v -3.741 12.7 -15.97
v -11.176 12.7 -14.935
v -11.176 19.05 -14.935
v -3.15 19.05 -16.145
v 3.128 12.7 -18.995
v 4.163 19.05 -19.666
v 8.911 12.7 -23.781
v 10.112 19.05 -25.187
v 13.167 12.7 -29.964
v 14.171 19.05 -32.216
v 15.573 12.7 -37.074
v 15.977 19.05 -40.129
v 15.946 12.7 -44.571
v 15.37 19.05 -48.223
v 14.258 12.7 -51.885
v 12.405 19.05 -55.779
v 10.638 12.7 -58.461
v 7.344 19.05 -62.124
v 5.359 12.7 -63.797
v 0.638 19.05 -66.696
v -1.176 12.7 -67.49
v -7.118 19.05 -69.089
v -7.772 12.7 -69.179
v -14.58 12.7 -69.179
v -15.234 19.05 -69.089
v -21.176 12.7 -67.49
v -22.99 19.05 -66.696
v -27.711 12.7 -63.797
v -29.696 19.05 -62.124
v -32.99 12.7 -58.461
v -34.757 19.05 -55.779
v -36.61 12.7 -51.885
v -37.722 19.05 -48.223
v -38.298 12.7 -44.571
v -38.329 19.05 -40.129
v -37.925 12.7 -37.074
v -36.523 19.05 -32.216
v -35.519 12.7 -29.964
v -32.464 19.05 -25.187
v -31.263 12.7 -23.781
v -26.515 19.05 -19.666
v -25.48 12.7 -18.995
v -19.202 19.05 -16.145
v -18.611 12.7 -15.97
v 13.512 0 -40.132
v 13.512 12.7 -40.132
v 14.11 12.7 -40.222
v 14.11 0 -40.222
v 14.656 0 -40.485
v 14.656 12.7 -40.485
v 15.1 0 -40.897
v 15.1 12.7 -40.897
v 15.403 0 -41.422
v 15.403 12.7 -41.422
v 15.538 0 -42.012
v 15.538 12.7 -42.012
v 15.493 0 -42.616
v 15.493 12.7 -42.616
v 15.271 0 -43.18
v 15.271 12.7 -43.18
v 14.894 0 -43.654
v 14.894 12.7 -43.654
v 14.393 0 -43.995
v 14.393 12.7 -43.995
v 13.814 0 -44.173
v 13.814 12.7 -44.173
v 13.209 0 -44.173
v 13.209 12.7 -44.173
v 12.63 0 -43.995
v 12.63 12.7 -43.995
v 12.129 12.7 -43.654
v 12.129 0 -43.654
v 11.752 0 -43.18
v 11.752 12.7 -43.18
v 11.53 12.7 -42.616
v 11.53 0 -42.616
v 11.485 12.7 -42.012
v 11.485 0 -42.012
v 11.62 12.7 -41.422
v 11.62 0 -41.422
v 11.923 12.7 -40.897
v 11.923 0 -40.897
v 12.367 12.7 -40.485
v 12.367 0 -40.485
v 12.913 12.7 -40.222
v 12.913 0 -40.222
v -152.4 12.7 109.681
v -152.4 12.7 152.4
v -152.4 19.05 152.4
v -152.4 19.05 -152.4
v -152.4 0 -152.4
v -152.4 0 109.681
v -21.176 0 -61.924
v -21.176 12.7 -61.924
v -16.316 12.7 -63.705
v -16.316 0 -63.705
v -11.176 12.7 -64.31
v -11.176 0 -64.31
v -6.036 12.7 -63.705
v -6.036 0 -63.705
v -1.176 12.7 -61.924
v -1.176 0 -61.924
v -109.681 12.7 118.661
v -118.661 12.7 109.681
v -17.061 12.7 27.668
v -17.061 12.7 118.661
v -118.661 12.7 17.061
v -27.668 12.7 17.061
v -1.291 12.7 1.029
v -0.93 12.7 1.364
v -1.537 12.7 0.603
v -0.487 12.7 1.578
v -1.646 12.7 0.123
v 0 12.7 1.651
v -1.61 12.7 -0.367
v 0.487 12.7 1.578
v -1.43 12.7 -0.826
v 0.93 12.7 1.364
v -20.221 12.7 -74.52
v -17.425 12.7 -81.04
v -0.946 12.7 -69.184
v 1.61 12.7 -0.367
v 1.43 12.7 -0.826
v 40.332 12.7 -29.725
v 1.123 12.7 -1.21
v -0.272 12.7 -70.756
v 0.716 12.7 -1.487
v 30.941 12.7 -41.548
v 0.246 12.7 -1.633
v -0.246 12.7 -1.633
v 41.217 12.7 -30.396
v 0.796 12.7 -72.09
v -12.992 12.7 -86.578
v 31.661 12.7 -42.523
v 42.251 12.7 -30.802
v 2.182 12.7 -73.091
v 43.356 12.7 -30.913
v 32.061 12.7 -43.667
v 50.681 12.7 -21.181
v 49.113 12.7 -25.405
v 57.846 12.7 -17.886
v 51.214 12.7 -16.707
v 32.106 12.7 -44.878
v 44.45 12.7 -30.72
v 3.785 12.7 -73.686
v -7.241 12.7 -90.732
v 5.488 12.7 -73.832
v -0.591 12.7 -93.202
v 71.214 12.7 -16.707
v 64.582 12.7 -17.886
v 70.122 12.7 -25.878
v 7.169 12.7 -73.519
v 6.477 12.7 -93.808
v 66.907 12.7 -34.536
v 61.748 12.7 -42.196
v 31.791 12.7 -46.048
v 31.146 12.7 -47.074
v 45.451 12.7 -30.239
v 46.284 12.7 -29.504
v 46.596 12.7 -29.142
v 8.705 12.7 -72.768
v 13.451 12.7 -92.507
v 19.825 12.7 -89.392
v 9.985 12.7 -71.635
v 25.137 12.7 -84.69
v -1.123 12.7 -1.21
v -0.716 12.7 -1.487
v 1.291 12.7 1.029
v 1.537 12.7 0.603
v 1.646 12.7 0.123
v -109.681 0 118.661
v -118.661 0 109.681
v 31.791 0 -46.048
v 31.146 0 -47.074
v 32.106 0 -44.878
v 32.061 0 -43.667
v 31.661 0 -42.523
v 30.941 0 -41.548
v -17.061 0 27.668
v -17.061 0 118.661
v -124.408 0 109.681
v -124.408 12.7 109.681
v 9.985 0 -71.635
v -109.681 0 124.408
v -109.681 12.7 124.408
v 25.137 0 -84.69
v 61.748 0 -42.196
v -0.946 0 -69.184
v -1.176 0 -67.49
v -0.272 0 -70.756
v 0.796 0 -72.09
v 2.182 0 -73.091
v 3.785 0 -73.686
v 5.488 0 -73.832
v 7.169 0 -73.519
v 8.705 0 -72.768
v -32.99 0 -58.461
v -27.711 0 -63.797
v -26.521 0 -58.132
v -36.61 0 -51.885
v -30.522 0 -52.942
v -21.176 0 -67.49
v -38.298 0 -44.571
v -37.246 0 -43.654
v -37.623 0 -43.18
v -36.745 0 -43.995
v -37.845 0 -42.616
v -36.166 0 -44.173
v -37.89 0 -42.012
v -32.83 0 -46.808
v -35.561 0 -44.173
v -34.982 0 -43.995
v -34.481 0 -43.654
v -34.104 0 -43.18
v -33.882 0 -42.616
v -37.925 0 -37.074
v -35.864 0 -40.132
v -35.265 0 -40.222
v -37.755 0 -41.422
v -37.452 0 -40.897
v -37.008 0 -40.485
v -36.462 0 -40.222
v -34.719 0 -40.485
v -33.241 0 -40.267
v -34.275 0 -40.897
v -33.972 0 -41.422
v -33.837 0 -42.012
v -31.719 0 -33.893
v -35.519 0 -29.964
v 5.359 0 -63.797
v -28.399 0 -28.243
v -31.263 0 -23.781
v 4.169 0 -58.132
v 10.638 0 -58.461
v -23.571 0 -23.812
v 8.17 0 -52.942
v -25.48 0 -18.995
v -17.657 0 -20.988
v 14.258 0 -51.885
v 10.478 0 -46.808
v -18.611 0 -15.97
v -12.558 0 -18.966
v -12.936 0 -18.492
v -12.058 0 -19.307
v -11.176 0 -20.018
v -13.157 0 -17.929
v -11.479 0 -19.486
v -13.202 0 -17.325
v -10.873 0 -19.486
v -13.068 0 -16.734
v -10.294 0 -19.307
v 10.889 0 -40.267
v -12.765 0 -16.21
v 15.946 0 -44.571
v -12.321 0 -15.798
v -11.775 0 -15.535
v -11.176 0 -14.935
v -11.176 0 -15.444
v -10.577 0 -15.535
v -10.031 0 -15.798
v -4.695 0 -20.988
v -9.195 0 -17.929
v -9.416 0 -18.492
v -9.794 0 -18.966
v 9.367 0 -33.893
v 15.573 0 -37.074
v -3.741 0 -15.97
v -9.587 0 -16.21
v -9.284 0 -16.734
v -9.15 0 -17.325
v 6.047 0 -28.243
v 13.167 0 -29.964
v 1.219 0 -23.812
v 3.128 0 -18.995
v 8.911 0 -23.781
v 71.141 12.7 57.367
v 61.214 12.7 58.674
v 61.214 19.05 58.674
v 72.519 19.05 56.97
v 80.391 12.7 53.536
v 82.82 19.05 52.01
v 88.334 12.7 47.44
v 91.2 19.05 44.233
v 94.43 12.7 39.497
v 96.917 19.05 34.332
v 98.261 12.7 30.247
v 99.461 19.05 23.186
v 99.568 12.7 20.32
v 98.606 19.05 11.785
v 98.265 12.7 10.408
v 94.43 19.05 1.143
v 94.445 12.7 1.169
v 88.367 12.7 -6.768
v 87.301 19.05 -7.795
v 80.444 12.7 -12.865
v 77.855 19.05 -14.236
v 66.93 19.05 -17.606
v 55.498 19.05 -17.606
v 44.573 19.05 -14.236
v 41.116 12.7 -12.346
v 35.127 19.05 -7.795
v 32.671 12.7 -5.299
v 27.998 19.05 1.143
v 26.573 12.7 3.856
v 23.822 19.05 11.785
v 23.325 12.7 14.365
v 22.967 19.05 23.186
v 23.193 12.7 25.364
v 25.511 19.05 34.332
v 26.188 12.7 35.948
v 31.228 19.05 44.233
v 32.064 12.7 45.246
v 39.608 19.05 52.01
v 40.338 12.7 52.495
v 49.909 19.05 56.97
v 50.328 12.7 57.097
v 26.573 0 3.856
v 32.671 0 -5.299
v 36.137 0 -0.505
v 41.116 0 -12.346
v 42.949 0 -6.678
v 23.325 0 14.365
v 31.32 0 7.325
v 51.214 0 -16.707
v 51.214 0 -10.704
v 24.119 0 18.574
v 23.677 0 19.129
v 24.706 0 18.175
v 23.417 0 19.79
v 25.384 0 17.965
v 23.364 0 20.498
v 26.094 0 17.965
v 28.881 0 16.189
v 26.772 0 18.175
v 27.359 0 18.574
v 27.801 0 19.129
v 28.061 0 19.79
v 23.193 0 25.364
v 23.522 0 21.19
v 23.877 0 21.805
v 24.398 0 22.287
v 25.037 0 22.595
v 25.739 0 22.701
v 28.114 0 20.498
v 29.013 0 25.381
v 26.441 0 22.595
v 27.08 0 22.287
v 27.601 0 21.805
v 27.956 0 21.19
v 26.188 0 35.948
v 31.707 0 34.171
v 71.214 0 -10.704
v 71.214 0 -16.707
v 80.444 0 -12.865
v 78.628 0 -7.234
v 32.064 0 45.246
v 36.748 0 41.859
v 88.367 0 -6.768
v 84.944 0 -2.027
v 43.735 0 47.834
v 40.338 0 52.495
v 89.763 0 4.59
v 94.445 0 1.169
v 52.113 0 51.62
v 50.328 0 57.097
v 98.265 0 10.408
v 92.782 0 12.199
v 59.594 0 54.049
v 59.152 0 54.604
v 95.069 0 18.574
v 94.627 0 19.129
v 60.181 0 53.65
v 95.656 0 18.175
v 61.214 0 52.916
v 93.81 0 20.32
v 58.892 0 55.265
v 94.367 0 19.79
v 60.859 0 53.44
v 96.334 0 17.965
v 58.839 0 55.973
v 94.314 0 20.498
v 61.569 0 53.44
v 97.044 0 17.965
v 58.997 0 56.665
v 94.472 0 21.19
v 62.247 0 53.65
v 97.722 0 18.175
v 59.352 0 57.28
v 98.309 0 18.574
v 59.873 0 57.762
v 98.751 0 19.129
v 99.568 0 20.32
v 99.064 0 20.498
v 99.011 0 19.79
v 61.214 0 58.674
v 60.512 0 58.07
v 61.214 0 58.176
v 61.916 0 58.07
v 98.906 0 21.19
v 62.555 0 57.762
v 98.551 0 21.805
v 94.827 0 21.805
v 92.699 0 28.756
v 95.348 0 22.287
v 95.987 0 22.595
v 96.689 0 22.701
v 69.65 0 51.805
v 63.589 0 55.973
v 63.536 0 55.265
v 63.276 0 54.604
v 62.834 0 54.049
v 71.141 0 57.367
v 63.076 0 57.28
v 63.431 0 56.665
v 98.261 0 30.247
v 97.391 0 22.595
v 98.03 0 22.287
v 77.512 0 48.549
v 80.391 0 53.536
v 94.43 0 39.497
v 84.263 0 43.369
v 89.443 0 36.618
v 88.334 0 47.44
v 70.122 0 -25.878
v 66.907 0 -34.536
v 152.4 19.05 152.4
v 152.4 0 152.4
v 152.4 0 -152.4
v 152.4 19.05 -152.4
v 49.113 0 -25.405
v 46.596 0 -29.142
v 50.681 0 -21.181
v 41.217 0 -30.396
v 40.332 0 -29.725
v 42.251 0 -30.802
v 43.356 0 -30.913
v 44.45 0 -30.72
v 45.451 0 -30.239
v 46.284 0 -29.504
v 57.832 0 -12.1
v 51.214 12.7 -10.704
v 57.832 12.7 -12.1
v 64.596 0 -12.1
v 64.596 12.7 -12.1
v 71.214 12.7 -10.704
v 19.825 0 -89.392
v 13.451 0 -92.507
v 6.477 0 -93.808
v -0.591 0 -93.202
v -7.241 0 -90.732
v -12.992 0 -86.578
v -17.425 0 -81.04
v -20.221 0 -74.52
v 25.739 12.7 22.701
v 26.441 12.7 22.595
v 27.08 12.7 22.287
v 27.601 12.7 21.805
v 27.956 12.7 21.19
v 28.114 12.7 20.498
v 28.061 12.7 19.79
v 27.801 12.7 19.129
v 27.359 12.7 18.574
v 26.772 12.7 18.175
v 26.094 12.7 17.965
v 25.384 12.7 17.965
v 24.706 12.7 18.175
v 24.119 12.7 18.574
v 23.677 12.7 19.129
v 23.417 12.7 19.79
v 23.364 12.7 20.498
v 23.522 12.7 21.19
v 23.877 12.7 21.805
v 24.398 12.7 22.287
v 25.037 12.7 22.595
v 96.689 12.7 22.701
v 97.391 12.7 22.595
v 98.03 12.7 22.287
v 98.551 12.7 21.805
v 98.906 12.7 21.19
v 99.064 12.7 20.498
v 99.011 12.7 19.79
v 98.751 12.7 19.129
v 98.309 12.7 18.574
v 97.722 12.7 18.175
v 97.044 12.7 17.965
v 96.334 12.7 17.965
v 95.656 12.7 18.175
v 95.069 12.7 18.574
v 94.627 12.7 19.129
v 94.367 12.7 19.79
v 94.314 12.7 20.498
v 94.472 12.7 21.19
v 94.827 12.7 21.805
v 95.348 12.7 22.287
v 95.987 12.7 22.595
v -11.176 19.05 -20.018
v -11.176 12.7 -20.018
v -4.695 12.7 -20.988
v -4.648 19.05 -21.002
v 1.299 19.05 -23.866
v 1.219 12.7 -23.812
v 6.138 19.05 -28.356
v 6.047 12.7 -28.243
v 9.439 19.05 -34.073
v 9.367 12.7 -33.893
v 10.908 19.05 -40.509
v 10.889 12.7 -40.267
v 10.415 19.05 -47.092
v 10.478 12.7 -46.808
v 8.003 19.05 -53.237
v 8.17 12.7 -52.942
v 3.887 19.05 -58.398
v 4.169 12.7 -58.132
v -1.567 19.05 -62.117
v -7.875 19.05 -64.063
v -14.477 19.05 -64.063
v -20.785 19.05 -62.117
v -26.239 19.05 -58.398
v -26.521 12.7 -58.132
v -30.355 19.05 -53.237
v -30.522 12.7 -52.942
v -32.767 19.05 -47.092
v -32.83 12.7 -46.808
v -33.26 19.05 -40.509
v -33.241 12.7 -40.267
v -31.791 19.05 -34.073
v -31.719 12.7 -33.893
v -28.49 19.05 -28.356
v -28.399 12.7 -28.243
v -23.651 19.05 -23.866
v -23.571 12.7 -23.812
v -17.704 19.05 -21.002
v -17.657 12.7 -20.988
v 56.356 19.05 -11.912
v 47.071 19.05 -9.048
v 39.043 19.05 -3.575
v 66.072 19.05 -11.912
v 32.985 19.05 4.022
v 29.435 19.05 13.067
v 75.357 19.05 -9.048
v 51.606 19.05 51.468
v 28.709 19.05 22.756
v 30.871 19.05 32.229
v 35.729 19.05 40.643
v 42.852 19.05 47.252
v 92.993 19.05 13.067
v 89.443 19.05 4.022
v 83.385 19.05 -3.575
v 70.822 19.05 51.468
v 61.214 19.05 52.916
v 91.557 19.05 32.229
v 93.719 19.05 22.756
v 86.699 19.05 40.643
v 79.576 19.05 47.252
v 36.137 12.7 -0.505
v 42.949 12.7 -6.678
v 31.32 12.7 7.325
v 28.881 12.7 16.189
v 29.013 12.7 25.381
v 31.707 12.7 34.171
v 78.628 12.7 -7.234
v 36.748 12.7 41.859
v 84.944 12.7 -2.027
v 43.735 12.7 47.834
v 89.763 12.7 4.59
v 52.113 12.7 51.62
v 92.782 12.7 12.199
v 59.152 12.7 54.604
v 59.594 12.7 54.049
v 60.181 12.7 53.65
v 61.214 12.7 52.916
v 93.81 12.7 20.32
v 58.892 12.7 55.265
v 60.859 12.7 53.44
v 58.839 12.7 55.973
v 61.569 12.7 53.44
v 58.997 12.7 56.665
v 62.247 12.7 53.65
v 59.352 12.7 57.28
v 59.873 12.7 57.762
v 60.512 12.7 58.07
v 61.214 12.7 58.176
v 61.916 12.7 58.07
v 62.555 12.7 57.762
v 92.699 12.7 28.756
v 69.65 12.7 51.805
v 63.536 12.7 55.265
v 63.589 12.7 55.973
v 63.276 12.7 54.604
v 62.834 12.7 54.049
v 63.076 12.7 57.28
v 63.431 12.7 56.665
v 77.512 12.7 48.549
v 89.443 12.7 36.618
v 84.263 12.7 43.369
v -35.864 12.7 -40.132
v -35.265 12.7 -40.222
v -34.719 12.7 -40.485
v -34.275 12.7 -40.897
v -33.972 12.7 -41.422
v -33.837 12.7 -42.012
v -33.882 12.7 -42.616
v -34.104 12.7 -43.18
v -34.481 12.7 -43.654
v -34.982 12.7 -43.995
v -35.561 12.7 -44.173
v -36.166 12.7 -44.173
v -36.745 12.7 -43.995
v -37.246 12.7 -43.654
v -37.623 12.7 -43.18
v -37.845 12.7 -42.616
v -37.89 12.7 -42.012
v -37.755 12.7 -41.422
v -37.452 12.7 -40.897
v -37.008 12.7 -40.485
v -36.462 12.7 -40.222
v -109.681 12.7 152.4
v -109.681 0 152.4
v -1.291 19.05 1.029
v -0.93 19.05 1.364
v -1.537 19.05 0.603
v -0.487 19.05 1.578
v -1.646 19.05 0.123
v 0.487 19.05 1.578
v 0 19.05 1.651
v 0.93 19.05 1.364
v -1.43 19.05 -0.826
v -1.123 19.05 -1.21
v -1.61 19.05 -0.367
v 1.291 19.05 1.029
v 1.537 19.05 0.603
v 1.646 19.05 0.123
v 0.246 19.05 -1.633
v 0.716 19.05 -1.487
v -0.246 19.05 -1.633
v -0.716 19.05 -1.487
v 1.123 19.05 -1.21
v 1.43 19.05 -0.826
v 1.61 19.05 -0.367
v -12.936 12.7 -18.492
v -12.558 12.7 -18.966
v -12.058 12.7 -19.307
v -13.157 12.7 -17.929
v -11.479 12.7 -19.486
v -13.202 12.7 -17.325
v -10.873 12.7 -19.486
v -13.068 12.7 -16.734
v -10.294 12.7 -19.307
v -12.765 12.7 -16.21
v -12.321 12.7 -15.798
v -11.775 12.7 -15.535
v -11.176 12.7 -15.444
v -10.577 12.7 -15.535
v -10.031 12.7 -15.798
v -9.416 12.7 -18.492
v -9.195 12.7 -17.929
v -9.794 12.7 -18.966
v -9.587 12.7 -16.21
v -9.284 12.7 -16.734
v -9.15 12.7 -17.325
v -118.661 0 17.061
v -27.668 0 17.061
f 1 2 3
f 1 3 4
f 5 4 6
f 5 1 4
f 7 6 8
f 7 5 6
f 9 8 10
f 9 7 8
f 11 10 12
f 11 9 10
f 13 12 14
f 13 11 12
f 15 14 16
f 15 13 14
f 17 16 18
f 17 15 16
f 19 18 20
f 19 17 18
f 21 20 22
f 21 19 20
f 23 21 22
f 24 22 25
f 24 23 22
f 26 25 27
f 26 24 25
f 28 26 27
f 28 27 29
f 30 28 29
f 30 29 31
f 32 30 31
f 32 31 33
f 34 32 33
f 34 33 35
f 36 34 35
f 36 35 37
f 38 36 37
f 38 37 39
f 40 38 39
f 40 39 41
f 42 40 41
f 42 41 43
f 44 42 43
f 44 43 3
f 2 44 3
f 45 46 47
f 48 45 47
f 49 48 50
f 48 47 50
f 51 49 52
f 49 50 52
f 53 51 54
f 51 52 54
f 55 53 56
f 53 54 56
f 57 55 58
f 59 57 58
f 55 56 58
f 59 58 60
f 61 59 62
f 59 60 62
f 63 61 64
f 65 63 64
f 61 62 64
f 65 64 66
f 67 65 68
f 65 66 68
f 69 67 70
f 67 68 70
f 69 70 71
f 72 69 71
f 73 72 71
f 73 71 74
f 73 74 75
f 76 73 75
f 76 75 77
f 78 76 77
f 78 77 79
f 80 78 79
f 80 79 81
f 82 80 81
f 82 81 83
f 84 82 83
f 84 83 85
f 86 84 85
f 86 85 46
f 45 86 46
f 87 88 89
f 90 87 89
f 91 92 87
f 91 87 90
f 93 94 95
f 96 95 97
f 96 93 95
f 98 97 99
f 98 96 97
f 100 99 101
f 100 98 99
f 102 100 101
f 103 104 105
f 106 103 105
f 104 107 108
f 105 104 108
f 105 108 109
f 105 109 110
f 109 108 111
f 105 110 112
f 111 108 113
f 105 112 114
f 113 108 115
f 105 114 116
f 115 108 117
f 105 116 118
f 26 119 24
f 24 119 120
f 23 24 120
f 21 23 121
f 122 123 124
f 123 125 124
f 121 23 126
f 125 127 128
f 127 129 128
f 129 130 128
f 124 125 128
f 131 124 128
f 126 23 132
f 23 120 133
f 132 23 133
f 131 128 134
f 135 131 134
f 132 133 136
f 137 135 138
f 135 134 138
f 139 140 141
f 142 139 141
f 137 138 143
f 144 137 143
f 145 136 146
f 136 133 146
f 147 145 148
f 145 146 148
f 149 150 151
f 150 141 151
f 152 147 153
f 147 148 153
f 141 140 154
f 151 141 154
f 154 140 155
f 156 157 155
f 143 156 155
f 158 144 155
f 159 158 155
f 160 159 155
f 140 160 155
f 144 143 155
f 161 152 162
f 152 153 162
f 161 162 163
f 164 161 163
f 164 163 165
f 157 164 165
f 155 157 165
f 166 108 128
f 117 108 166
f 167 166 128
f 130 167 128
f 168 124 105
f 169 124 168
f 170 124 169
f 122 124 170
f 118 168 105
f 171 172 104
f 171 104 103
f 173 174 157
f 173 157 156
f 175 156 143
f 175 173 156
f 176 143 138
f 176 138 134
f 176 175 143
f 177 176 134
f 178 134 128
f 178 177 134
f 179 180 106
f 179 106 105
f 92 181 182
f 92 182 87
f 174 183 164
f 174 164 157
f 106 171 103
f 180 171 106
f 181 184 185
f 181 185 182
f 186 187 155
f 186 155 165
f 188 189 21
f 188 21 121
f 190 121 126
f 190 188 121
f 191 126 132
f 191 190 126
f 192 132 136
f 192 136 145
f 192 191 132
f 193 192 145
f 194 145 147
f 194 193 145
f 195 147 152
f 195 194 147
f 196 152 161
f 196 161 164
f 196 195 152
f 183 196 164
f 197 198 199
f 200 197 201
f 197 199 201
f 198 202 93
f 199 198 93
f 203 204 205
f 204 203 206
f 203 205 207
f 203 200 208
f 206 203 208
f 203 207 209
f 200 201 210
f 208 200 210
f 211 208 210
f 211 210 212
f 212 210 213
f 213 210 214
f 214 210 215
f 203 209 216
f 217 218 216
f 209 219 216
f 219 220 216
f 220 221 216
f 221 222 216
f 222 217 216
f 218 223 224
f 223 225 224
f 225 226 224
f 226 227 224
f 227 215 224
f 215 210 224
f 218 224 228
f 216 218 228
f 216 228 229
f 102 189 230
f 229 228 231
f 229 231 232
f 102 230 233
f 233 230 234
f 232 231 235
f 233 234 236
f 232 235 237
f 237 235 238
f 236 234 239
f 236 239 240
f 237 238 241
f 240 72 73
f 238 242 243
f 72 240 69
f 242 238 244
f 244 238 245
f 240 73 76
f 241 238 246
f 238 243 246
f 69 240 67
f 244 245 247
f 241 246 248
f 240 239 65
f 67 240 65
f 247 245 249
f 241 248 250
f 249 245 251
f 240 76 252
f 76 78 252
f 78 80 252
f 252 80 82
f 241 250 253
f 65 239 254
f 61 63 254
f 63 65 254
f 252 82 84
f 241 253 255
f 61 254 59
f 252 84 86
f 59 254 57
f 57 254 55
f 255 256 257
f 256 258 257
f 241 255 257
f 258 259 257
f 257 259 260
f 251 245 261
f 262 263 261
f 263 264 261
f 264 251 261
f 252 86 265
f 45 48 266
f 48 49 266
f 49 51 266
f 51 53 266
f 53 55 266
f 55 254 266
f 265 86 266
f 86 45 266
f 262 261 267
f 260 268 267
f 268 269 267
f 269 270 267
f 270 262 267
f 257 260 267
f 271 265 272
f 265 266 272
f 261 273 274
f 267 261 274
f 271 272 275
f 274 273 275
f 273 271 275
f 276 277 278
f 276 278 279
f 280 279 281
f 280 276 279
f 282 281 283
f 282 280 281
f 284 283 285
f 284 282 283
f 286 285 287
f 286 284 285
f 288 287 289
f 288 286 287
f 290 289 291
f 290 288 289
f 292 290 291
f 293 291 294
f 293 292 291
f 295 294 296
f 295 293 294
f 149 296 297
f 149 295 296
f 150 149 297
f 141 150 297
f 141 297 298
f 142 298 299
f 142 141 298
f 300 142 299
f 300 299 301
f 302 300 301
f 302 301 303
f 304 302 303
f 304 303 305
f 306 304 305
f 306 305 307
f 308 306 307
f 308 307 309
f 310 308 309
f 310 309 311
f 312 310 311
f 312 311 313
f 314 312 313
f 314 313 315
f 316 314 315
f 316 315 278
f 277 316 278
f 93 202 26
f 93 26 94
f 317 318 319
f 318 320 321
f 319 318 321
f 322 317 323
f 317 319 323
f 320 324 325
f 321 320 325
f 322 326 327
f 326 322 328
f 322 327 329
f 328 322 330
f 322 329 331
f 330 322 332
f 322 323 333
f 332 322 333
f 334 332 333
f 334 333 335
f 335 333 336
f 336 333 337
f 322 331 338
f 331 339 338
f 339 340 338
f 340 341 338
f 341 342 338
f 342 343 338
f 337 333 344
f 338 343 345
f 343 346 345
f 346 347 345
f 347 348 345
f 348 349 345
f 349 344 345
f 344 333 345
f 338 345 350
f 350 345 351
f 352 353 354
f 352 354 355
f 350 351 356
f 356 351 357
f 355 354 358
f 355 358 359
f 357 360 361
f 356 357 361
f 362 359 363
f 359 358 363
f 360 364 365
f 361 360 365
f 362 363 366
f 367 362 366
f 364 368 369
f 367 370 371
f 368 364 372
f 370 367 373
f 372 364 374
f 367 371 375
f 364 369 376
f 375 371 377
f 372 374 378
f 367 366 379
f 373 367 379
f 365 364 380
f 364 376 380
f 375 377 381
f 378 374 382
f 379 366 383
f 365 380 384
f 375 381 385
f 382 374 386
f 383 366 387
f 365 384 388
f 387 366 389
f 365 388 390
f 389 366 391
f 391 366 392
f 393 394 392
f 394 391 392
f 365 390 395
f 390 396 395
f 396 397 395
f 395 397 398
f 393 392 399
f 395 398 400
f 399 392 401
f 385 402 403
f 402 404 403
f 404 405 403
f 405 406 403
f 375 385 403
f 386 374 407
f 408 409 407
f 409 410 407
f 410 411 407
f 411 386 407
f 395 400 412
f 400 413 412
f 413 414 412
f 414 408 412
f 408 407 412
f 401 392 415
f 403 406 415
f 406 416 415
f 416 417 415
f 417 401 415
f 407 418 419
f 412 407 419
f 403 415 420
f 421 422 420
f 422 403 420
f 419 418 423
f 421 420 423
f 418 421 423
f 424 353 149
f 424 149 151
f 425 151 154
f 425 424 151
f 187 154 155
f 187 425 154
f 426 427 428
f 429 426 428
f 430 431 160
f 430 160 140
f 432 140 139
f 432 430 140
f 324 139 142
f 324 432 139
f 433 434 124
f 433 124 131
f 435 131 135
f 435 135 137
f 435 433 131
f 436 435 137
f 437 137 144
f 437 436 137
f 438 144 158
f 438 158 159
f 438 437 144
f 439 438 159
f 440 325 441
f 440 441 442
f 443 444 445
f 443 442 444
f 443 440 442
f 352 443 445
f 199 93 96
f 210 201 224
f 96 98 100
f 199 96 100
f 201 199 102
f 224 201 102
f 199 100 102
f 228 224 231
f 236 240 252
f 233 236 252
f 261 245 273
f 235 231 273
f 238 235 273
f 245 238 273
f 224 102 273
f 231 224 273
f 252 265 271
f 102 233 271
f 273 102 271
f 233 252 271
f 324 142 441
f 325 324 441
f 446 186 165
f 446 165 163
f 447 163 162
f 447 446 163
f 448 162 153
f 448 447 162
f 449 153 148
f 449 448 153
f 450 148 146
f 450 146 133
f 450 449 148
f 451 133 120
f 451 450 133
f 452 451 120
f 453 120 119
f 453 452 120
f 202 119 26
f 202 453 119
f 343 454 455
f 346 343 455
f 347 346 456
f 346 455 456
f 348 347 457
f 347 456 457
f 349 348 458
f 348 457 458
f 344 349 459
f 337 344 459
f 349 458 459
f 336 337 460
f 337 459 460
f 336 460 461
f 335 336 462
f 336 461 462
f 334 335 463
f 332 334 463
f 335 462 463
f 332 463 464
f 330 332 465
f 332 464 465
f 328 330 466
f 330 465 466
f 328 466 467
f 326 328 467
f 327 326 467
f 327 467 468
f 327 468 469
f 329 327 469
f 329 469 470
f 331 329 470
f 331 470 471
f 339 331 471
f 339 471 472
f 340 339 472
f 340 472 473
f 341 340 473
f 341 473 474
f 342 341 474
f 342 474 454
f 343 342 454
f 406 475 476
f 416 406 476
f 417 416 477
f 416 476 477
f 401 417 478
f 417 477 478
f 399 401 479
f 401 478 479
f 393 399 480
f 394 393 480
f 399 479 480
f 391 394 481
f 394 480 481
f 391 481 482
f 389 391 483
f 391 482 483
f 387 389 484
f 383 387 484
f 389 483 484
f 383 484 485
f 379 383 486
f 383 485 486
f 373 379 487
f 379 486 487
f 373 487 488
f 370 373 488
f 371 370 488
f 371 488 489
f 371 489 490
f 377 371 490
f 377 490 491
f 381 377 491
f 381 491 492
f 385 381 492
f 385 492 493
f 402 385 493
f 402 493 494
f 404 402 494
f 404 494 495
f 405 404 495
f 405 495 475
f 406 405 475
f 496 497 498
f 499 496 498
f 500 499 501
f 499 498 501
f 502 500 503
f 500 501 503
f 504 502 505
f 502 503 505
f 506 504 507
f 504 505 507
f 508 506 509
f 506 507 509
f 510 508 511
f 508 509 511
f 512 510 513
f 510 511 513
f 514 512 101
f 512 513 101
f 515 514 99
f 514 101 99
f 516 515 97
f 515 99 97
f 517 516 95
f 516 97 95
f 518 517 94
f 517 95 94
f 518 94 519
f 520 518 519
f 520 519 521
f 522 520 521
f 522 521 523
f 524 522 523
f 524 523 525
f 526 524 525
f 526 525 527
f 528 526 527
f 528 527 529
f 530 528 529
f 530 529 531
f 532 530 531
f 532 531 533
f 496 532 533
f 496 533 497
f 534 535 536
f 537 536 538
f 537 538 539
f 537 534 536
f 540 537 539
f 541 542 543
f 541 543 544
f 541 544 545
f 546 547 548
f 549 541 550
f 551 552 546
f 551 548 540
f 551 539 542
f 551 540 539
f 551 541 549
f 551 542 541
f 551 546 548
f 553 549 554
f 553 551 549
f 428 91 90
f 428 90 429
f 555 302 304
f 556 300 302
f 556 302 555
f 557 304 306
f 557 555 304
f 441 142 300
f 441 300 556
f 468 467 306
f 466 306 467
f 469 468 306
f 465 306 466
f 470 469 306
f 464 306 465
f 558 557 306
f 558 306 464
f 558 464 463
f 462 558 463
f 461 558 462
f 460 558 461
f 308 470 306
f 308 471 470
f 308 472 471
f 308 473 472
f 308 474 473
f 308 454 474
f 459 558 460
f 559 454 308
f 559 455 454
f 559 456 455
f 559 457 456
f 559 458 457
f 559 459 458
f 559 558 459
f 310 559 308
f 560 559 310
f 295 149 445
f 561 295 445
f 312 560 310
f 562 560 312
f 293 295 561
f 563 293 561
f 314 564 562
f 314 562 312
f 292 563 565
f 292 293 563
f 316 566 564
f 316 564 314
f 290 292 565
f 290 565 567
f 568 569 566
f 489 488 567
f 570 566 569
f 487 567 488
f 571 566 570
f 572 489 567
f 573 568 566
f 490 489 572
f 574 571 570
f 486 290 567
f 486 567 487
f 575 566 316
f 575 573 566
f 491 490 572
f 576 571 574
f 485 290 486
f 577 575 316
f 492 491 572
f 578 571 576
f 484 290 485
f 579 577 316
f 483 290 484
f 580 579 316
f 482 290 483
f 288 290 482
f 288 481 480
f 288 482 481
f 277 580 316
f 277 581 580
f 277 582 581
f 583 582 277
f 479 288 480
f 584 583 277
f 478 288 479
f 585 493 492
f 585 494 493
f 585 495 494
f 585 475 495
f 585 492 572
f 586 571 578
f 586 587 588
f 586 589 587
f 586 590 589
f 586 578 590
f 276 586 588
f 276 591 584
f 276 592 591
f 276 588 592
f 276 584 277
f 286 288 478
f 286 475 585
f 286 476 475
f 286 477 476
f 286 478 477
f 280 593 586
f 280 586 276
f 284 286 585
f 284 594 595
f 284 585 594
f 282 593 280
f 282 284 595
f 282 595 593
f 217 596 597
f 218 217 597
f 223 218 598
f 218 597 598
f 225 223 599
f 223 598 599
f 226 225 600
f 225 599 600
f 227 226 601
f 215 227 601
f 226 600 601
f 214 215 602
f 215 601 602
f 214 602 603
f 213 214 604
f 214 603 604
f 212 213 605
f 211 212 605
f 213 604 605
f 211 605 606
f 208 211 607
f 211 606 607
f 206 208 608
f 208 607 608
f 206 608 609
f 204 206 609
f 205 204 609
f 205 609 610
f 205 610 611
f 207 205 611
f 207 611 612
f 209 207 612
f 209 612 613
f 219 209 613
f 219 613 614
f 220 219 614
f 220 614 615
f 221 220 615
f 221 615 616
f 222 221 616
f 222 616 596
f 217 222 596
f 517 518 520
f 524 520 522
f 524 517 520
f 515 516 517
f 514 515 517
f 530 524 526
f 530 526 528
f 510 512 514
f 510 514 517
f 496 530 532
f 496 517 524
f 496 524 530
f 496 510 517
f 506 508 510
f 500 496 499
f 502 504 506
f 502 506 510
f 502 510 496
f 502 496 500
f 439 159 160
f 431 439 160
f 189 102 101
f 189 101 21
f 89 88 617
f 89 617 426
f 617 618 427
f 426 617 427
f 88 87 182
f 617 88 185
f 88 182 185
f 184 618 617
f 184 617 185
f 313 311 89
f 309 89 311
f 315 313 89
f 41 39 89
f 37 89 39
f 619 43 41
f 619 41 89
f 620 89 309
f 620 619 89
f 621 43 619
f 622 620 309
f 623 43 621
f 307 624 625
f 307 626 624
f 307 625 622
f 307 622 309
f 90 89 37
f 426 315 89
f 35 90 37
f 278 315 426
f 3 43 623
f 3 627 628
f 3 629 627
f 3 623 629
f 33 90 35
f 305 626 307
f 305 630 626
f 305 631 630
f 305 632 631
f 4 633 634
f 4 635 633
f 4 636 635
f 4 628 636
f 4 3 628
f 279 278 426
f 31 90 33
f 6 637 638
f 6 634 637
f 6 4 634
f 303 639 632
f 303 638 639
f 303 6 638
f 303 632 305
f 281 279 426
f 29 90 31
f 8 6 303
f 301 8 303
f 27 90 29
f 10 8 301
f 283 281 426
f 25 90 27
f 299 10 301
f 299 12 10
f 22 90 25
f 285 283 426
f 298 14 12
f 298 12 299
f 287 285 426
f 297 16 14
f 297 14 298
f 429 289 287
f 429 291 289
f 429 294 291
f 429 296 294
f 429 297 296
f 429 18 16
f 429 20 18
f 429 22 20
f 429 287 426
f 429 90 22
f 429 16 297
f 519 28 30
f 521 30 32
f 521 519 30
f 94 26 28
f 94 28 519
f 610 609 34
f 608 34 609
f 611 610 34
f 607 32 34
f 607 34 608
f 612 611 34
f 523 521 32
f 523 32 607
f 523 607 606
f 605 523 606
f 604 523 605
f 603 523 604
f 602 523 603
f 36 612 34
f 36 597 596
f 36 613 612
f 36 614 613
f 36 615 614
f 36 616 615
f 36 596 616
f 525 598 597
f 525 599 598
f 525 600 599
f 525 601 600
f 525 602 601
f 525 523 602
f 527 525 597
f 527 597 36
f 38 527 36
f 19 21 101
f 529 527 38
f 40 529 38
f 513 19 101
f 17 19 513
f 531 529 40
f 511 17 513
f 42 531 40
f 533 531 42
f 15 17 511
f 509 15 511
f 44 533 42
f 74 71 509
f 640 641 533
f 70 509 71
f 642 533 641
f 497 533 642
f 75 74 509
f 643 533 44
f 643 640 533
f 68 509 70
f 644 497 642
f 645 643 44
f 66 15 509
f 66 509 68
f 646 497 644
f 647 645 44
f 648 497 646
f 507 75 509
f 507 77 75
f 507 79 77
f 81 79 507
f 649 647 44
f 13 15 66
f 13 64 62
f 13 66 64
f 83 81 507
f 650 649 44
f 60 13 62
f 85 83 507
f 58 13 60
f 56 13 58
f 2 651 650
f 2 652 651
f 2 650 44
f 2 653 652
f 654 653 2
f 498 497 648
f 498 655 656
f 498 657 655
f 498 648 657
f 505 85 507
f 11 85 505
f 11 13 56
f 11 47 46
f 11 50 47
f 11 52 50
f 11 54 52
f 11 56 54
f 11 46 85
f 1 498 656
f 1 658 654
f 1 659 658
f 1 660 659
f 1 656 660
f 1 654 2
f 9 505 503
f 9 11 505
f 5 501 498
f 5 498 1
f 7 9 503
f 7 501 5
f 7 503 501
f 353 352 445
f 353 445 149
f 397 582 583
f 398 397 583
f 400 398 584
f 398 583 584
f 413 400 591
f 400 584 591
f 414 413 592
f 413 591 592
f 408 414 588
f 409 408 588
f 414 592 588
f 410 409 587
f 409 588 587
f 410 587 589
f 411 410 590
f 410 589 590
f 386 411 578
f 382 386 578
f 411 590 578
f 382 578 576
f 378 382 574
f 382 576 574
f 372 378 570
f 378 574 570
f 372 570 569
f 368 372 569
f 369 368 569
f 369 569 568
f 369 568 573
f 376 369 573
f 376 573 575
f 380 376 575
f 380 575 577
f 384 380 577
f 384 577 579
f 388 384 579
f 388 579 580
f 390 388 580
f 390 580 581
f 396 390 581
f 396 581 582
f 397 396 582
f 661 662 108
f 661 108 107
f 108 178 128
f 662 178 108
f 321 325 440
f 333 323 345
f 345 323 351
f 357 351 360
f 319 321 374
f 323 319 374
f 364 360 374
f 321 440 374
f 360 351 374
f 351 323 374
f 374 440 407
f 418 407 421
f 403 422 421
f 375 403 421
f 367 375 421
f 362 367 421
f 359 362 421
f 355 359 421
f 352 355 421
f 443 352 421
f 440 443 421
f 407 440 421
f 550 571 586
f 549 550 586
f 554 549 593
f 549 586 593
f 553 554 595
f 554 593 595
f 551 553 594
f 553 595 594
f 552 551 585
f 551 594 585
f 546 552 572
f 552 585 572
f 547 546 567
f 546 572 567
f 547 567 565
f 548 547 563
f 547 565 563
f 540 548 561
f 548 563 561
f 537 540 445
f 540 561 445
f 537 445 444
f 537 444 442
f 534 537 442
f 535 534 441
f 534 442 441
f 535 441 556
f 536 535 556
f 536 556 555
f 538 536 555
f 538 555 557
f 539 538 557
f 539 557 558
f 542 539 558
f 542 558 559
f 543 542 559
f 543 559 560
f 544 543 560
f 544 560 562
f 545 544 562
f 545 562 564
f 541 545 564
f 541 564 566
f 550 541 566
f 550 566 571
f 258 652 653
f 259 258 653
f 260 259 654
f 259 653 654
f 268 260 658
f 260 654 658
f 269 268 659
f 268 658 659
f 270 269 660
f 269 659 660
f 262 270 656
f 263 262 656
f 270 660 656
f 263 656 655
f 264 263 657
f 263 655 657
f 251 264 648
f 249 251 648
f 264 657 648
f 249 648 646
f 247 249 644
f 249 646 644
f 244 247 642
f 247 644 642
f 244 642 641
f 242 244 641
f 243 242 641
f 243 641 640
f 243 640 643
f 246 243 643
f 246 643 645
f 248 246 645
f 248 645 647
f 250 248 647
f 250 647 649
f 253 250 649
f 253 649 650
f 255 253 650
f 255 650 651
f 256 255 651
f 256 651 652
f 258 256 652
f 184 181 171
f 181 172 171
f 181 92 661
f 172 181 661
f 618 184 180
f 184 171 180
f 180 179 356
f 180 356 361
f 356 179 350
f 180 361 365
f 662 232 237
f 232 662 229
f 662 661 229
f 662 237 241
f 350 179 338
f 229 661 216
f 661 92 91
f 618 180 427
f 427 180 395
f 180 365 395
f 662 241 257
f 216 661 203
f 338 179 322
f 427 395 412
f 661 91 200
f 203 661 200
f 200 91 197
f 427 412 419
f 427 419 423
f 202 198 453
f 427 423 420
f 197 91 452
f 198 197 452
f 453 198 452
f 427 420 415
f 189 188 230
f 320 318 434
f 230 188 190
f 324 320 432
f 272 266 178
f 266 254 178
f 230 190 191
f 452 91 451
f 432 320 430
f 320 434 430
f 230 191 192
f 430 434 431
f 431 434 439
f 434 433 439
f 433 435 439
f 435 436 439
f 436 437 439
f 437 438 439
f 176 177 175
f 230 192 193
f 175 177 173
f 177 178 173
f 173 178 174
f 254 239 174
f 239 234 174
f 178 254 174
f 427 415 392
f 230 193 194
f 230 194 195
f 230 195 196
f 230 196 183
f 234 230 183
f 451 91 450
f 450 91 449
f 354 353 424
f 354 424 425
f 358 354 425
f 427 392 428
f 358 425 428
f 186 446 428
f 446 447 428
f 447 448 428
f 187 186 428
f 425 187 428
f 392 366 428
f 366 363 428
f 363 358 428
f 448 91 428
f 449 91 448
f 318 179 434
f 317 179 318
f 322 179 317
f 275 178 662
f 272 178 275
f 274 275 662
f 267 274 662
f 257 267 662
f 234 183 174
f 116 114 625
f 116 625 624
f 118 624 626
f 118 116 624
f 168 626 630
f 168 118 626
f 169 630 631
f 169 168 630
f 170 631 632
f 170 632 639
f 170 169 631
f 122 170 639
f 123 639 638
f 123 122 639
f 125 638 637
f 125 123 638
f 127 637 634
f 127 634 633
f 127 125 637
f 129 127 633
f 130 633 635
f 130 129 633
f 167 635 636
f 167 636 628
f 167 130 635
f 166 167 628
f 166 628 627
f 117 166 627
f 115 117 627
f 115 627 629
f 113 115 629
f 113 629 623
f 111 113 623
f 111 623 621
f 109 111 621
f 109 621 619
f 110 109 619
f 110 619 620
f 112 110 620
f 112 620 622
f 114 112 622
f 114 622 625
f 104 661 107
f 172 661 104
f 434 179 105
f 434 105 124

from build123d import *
from build123d.topology import SkipClean

# Parameters (mm, degrees)
SKETCH1_R             = 22.146000031
BOSS_EXTRUDE1_DEPTH   = 19.05
SKETCH1_R_2           = 32.595999959
BOSS_EXTRUDE1_2_DEPTH = 19.05
SKETCH1_W             = 304.8
SKETCH1_H             = 304.8
SKETCH1_R_3           = 27.229000025
SKETCH1_R_4           = 38.354
SKETCH1_R_5           = 1.651
BOSS_EXTRUDE1_3_DEPTH = 19.05
SKETCH1_4_R           = 27.229000025
SKETCH1_4_R_2         = 22.146000031
SKETCH1_4_R_3         = 38.354
SKETCH1_4_R_4         = 32.595999959
BOSS_EXTRUDE2_DEPTH   = 12.7
SKETCH1_5_R           = 1.651
CUT_EXTRUDE1_DEPTH    = 12.7
SKETCH5_R             = 2.032
SKETCH5_R_2           = 2.38125
CUT_EXTRUDE2_DEPTH    = 13.7


with BuildPart() as part:
    # Sketch1 → Boss-Extrude1 (new body)
    with BuildSketch(Plane(origin=(0, 0, 0), x_dir=(1, 0, 0), z_dir=(0, 1, 0))):
        with Locations(Location((-11.176, 42.164, 0), (0, 0, 270))):  # turned: the seam where the file's is
            Circle(SKETCH1_R)
    extrude(amount=BOSS_EXTRUDE1_DEPTH)



with BuildPart() as body_2:
    # Sketch1 → Boss-Extrude1 2 (new body)
    with BuildSketch(Plane(origin=(0, 0, 0), x_dir=(1, 0, 0), z_dir=(0, 1, 0))):
        with Locations(Location((61.214, -20.32, 0), (0, 0, 270))):  # turned: the seam where the file's is
            Circle(SKETCH1_R_2)
    extrude(amount=BOSS_EXTRUDE1_2_DEPTH)


with BuildPart() as body_3:
    # Sketch1 → Boss-Extrude1 3 (new body)
    with BuildSketch(Plane(origin=(0, 0, 0), x_dir=(1, 0, 0), z_dir=(0, 1, 0))):
        Rectangle(SKETCH1_W, SKETCH1_H)
        with Locations(Location((-11.176, 42.164, 0), (0, 0, 270))):  # turned: the seam where the file's is
            Circle(SKETCH1_R_3, mode=Mode.SUBTRACT)
        with Locations(Location((61.214, -20.32, 0), (0, 0, 270))):  # turned: the seam where the file's is
            Circle(SKETCH1_R_4, mode=Mode.SUBTRACT)
        with Locations(Location((0, 0, 0), (0, 0, 270))):  # turned: the seam where the file's is
            Circle(SKETCH1_R_5, mode=Mode.SUBTRACT)
    extrude(amount=BOSS_EXTRUDE1_3_DEPTH)


with BuildPart() as part_1:
    with SkipClean():  # keep this step's faces unmerged: merging them makes the solid invalid here
        add(part.part)

        add(body_2.part)  # Boss-Extrude2 merges body 2

        add(body_3.part)  # Boss-Extrude2 merges body 3
        # Sketch1_4 → Boss-Extrude2 (add)
        with BuildSketch(Plane(origin=(0, 0, 0), x_dir=(1, 0, 0), z_dir=(0, 1, 0))):
            with Locations(Location((-11.176, 42.164, 0), (0, 0, 270))):  # turned: the seam where the file's is
                Circle(SKETCH1_4_R)
            with Locations(Location((-11.176, 42.164, 0), (0, 0, 270))):  # turned: the seam where the file's is
                Circle(SKETCH1_4_R_2, mode=Mode.SUBTRACT)
            with Locations(Location((61.214, -20.32, 0), (0, 0, 270))):  # turned: the seam where the file's is
                Circle(SKETCH1_4_R_3)
            with Locations(Location((61.214, -20.32, 0), (0, 0, 270))):  # turned: the seam where the file's is
                Circle(SKETCH1_4_R_4, mode=Mode.SUBTRACT)
            with BuildLine():
                ThreePointArc((99.568, -20.32), (91.665349034, 2.998333088), (71.214, 16.707413034))
                Line((71.214, 16.707413034), (71.214, 10.704171437))
                ThreePointArc((71.214, 10.704171437), (87.562237255, -1.129648079), (93.809999959, -20.32))
                ThreePointArc((93.809999959, -20.32), (42.023648079, -46.668237255), (51.214, 10.704171437))
                Line((51.214, 10.704171437), (51.214, 16.707413034))
                ThreePointArc((51.214, 16.707413034), (37.895666912, -50.771349034), (99.568, -20.32))
            make_face()
            with BuildLine():
                Line((71.214, 10.704171437), (71.214, 16.707413034))
                ThreePointArc((71.214, 16.707413034), (61.214, 18.034), (51.214, 16.707413034))
                Line((51.214, 16.707413034), (51.214, 10.704171437))
                ThreePointArc((51.214, 10.704171437), (61.214, 12.275999959), (71.214, 10.704171437))
            make_face()
            with BuildLine():
                ThreePointArc((-1.176, 67.490240194), (-11.176, 69.393000025), (-21.176, 67.490240194))
                Line((-21.176, 67.490240194), (-21.176, 61.923689202))
                ThreePointArc((-21.176, 61.923689202), (-11.176, 64.310000031), (-1.176, 61.923689202))
                Line((-1.176, 61.923689202), (-1.176, 67.490240194))
            make_face()
            with BuildLine():
                Line((-21.176, 61.923689202), (-21.176, 67.490240194))
                ThreePointArc((-21.176, 67.490240194), (-26.491489579, 19.650576864), (16.053000025, 42.164))
                ThreePointArc((16.053000025, 42.164), (11.337423136, 57.479489579), (-1.176, 67.490240194))
                Line((-1.176, 67.490240194), (-1.176, 61.923689202))
                ThreePointArc((-1.176, 61.923689202), (7.690707684, 53.761096987), (10.970000031, 42.164))
                ThreePointArc((10.970000031, 42.164), (-22.773096987, 23.297292316), (-21.176, 61.923689202))
            make_face()
        extrude(amount=BOSS_EXTRUDE2_DEPTH)

    # Sketch1_5 → Cut-Extrude1 (cut)
    with SkipClean():  # keep this step's faces unmerged: merging them makes the solid invalid here
        with BuildSketch(Plane(origin=(0, 0, 0), x_dir=(1, 0, 0), z_dir=(0, 1, 0))):
            Polygon((-124.40847096, -109.680850921), (-152.4, -109.680850921), (-152.4, -152.4), (-109.680850921, -152.4), (-109.680850921, -124.40847096), align=None)
            with BuildLine():
                ThreePointArc((71.214, 16.707413034), (68.771077011, 30.302427293), (61.747960937, 42.196464709))
                Line((61.747960937, 42.196464709), (25.136544704, 84.689638699))
                ThreePointArc((25.136544704, 84.689638699), (-3.999588367, 92.191814566), (-21.176, 67.490240194))
                Line((-21.176, 67.490240194), (-21.176, 61.923689202))
                ThreePointArc((-21.176, 61.923689202), (-11.176, 64.310000031), (-1.176, 61.923689202))
                Line((-1.176, 61.923689202), (-1.176, 67.490240194))
                ThreePointArc((-1.176, 67.490240194), (2.963287054, 73.442991513), (9.984708116, 71.635066779))
                Line((9.984708116, 71.635066779), (31.14615486, 47.073956315))
                ThreePointArc((31.14615486, 47.073956315), (32.128503793, 44.270491708), (30.940983624, 41.547585342))
                Line((30.940983624, 41.547585342), (-27.66770876, -17.061107042))
                Line((-27.66770876, -17.061107042), (-118.661107042, -17.061107042))
                Line((-118.661107042, -17.061107042), (-118.661107042, -109.680850921))
                Line((-118.661107042, -109.680850921), (-109.680850921, -118.661107042))
                Line((-109.680850921, -118.661107042), (-17.061107042, -118.661107042))
                Line((-17.061107042, -118.661107042), (-17.061107042, -27.66770876))
                Line((-17.061107042, -27.66770876), (40.331599468, 29.72499775))
                ThreePointArc((40.331599468, 29.72499775), (43.35605702, 30.912517919), (46.284134621, 29.504004806))
                Line((46.284134621, 29.504004806), (46.596124349, 29.141892789))
                ThreePointArc((46.596124349, 29.141892789), (50.022253958, 23.339551873), (51.214, 16.707413034))
                Line((51.214, 16.707413034), (51.214, 10.704171437))
                ThreePointArc((51.214, 10.704171437), (61.214, 12.275999959), (71.214, 10.704171437))
                Line((71.214, 10.704171437), (71.214, 16.707413034))
            make_face()
            with Locations(Location((0, 0, 0), (0, 0, 270))):  # turned: the seam where the file's is
                Circle(SKETCH1_5_R, mode=Mode.SUBTRACT)
        extrude(amount=CUT_EXTRUDE1_DEPTH, mode=Mode.SUBTRACT)

    # Sketch5 → Cut-Extrude2 (cut, through all)
    with SkipClean():  # keep this step's faces unmerged: merging them makes the solid invalid here
        with BuildSketch(Plane(origin=(0, 12.7, 0), x_dir=(1, 0, 0), z_dir=(0, 1, 0))):
            with Locations(Location((-11.176, 17.476499972, 0), (0, 0, 270))):  # turned: the seam where the file's is
                Circle(SKETCH5_R)
            with Locations(Location((13.511500028, 42.164, 0), (0, 0, 270))):  # turned: the seam where the file's is
                Circle(SKETCH5_R)
            with Locations(Location((-35.863500028, 42.164, 0), (0, 0, 270))):  # turned: the seam where the file's is
                Circle(SKETCH5_R)
            with Locations(Location((25.739000021, -20.32, 0), (0, 0, 270))):  # turned: the seam where the file's is
                Circle(SKETCH5_R_2)
            with Locations(Location((96.68899998, -20.32, 0), (0, 0, 270))):  # turned: the seam where the file's is
                Circle(SKETCH5_R_2)
            with Locations(Location((61.214, -55.794999979, 0), (0, 0, 270))):  # turned: the seam where the file's is
                Circle(SKETCH5_R_2)
        extrude(amount=-CUT_EXTRUDE2_DEPTH, mode=Mode.SUBTRACT)


solid = part_1.part
